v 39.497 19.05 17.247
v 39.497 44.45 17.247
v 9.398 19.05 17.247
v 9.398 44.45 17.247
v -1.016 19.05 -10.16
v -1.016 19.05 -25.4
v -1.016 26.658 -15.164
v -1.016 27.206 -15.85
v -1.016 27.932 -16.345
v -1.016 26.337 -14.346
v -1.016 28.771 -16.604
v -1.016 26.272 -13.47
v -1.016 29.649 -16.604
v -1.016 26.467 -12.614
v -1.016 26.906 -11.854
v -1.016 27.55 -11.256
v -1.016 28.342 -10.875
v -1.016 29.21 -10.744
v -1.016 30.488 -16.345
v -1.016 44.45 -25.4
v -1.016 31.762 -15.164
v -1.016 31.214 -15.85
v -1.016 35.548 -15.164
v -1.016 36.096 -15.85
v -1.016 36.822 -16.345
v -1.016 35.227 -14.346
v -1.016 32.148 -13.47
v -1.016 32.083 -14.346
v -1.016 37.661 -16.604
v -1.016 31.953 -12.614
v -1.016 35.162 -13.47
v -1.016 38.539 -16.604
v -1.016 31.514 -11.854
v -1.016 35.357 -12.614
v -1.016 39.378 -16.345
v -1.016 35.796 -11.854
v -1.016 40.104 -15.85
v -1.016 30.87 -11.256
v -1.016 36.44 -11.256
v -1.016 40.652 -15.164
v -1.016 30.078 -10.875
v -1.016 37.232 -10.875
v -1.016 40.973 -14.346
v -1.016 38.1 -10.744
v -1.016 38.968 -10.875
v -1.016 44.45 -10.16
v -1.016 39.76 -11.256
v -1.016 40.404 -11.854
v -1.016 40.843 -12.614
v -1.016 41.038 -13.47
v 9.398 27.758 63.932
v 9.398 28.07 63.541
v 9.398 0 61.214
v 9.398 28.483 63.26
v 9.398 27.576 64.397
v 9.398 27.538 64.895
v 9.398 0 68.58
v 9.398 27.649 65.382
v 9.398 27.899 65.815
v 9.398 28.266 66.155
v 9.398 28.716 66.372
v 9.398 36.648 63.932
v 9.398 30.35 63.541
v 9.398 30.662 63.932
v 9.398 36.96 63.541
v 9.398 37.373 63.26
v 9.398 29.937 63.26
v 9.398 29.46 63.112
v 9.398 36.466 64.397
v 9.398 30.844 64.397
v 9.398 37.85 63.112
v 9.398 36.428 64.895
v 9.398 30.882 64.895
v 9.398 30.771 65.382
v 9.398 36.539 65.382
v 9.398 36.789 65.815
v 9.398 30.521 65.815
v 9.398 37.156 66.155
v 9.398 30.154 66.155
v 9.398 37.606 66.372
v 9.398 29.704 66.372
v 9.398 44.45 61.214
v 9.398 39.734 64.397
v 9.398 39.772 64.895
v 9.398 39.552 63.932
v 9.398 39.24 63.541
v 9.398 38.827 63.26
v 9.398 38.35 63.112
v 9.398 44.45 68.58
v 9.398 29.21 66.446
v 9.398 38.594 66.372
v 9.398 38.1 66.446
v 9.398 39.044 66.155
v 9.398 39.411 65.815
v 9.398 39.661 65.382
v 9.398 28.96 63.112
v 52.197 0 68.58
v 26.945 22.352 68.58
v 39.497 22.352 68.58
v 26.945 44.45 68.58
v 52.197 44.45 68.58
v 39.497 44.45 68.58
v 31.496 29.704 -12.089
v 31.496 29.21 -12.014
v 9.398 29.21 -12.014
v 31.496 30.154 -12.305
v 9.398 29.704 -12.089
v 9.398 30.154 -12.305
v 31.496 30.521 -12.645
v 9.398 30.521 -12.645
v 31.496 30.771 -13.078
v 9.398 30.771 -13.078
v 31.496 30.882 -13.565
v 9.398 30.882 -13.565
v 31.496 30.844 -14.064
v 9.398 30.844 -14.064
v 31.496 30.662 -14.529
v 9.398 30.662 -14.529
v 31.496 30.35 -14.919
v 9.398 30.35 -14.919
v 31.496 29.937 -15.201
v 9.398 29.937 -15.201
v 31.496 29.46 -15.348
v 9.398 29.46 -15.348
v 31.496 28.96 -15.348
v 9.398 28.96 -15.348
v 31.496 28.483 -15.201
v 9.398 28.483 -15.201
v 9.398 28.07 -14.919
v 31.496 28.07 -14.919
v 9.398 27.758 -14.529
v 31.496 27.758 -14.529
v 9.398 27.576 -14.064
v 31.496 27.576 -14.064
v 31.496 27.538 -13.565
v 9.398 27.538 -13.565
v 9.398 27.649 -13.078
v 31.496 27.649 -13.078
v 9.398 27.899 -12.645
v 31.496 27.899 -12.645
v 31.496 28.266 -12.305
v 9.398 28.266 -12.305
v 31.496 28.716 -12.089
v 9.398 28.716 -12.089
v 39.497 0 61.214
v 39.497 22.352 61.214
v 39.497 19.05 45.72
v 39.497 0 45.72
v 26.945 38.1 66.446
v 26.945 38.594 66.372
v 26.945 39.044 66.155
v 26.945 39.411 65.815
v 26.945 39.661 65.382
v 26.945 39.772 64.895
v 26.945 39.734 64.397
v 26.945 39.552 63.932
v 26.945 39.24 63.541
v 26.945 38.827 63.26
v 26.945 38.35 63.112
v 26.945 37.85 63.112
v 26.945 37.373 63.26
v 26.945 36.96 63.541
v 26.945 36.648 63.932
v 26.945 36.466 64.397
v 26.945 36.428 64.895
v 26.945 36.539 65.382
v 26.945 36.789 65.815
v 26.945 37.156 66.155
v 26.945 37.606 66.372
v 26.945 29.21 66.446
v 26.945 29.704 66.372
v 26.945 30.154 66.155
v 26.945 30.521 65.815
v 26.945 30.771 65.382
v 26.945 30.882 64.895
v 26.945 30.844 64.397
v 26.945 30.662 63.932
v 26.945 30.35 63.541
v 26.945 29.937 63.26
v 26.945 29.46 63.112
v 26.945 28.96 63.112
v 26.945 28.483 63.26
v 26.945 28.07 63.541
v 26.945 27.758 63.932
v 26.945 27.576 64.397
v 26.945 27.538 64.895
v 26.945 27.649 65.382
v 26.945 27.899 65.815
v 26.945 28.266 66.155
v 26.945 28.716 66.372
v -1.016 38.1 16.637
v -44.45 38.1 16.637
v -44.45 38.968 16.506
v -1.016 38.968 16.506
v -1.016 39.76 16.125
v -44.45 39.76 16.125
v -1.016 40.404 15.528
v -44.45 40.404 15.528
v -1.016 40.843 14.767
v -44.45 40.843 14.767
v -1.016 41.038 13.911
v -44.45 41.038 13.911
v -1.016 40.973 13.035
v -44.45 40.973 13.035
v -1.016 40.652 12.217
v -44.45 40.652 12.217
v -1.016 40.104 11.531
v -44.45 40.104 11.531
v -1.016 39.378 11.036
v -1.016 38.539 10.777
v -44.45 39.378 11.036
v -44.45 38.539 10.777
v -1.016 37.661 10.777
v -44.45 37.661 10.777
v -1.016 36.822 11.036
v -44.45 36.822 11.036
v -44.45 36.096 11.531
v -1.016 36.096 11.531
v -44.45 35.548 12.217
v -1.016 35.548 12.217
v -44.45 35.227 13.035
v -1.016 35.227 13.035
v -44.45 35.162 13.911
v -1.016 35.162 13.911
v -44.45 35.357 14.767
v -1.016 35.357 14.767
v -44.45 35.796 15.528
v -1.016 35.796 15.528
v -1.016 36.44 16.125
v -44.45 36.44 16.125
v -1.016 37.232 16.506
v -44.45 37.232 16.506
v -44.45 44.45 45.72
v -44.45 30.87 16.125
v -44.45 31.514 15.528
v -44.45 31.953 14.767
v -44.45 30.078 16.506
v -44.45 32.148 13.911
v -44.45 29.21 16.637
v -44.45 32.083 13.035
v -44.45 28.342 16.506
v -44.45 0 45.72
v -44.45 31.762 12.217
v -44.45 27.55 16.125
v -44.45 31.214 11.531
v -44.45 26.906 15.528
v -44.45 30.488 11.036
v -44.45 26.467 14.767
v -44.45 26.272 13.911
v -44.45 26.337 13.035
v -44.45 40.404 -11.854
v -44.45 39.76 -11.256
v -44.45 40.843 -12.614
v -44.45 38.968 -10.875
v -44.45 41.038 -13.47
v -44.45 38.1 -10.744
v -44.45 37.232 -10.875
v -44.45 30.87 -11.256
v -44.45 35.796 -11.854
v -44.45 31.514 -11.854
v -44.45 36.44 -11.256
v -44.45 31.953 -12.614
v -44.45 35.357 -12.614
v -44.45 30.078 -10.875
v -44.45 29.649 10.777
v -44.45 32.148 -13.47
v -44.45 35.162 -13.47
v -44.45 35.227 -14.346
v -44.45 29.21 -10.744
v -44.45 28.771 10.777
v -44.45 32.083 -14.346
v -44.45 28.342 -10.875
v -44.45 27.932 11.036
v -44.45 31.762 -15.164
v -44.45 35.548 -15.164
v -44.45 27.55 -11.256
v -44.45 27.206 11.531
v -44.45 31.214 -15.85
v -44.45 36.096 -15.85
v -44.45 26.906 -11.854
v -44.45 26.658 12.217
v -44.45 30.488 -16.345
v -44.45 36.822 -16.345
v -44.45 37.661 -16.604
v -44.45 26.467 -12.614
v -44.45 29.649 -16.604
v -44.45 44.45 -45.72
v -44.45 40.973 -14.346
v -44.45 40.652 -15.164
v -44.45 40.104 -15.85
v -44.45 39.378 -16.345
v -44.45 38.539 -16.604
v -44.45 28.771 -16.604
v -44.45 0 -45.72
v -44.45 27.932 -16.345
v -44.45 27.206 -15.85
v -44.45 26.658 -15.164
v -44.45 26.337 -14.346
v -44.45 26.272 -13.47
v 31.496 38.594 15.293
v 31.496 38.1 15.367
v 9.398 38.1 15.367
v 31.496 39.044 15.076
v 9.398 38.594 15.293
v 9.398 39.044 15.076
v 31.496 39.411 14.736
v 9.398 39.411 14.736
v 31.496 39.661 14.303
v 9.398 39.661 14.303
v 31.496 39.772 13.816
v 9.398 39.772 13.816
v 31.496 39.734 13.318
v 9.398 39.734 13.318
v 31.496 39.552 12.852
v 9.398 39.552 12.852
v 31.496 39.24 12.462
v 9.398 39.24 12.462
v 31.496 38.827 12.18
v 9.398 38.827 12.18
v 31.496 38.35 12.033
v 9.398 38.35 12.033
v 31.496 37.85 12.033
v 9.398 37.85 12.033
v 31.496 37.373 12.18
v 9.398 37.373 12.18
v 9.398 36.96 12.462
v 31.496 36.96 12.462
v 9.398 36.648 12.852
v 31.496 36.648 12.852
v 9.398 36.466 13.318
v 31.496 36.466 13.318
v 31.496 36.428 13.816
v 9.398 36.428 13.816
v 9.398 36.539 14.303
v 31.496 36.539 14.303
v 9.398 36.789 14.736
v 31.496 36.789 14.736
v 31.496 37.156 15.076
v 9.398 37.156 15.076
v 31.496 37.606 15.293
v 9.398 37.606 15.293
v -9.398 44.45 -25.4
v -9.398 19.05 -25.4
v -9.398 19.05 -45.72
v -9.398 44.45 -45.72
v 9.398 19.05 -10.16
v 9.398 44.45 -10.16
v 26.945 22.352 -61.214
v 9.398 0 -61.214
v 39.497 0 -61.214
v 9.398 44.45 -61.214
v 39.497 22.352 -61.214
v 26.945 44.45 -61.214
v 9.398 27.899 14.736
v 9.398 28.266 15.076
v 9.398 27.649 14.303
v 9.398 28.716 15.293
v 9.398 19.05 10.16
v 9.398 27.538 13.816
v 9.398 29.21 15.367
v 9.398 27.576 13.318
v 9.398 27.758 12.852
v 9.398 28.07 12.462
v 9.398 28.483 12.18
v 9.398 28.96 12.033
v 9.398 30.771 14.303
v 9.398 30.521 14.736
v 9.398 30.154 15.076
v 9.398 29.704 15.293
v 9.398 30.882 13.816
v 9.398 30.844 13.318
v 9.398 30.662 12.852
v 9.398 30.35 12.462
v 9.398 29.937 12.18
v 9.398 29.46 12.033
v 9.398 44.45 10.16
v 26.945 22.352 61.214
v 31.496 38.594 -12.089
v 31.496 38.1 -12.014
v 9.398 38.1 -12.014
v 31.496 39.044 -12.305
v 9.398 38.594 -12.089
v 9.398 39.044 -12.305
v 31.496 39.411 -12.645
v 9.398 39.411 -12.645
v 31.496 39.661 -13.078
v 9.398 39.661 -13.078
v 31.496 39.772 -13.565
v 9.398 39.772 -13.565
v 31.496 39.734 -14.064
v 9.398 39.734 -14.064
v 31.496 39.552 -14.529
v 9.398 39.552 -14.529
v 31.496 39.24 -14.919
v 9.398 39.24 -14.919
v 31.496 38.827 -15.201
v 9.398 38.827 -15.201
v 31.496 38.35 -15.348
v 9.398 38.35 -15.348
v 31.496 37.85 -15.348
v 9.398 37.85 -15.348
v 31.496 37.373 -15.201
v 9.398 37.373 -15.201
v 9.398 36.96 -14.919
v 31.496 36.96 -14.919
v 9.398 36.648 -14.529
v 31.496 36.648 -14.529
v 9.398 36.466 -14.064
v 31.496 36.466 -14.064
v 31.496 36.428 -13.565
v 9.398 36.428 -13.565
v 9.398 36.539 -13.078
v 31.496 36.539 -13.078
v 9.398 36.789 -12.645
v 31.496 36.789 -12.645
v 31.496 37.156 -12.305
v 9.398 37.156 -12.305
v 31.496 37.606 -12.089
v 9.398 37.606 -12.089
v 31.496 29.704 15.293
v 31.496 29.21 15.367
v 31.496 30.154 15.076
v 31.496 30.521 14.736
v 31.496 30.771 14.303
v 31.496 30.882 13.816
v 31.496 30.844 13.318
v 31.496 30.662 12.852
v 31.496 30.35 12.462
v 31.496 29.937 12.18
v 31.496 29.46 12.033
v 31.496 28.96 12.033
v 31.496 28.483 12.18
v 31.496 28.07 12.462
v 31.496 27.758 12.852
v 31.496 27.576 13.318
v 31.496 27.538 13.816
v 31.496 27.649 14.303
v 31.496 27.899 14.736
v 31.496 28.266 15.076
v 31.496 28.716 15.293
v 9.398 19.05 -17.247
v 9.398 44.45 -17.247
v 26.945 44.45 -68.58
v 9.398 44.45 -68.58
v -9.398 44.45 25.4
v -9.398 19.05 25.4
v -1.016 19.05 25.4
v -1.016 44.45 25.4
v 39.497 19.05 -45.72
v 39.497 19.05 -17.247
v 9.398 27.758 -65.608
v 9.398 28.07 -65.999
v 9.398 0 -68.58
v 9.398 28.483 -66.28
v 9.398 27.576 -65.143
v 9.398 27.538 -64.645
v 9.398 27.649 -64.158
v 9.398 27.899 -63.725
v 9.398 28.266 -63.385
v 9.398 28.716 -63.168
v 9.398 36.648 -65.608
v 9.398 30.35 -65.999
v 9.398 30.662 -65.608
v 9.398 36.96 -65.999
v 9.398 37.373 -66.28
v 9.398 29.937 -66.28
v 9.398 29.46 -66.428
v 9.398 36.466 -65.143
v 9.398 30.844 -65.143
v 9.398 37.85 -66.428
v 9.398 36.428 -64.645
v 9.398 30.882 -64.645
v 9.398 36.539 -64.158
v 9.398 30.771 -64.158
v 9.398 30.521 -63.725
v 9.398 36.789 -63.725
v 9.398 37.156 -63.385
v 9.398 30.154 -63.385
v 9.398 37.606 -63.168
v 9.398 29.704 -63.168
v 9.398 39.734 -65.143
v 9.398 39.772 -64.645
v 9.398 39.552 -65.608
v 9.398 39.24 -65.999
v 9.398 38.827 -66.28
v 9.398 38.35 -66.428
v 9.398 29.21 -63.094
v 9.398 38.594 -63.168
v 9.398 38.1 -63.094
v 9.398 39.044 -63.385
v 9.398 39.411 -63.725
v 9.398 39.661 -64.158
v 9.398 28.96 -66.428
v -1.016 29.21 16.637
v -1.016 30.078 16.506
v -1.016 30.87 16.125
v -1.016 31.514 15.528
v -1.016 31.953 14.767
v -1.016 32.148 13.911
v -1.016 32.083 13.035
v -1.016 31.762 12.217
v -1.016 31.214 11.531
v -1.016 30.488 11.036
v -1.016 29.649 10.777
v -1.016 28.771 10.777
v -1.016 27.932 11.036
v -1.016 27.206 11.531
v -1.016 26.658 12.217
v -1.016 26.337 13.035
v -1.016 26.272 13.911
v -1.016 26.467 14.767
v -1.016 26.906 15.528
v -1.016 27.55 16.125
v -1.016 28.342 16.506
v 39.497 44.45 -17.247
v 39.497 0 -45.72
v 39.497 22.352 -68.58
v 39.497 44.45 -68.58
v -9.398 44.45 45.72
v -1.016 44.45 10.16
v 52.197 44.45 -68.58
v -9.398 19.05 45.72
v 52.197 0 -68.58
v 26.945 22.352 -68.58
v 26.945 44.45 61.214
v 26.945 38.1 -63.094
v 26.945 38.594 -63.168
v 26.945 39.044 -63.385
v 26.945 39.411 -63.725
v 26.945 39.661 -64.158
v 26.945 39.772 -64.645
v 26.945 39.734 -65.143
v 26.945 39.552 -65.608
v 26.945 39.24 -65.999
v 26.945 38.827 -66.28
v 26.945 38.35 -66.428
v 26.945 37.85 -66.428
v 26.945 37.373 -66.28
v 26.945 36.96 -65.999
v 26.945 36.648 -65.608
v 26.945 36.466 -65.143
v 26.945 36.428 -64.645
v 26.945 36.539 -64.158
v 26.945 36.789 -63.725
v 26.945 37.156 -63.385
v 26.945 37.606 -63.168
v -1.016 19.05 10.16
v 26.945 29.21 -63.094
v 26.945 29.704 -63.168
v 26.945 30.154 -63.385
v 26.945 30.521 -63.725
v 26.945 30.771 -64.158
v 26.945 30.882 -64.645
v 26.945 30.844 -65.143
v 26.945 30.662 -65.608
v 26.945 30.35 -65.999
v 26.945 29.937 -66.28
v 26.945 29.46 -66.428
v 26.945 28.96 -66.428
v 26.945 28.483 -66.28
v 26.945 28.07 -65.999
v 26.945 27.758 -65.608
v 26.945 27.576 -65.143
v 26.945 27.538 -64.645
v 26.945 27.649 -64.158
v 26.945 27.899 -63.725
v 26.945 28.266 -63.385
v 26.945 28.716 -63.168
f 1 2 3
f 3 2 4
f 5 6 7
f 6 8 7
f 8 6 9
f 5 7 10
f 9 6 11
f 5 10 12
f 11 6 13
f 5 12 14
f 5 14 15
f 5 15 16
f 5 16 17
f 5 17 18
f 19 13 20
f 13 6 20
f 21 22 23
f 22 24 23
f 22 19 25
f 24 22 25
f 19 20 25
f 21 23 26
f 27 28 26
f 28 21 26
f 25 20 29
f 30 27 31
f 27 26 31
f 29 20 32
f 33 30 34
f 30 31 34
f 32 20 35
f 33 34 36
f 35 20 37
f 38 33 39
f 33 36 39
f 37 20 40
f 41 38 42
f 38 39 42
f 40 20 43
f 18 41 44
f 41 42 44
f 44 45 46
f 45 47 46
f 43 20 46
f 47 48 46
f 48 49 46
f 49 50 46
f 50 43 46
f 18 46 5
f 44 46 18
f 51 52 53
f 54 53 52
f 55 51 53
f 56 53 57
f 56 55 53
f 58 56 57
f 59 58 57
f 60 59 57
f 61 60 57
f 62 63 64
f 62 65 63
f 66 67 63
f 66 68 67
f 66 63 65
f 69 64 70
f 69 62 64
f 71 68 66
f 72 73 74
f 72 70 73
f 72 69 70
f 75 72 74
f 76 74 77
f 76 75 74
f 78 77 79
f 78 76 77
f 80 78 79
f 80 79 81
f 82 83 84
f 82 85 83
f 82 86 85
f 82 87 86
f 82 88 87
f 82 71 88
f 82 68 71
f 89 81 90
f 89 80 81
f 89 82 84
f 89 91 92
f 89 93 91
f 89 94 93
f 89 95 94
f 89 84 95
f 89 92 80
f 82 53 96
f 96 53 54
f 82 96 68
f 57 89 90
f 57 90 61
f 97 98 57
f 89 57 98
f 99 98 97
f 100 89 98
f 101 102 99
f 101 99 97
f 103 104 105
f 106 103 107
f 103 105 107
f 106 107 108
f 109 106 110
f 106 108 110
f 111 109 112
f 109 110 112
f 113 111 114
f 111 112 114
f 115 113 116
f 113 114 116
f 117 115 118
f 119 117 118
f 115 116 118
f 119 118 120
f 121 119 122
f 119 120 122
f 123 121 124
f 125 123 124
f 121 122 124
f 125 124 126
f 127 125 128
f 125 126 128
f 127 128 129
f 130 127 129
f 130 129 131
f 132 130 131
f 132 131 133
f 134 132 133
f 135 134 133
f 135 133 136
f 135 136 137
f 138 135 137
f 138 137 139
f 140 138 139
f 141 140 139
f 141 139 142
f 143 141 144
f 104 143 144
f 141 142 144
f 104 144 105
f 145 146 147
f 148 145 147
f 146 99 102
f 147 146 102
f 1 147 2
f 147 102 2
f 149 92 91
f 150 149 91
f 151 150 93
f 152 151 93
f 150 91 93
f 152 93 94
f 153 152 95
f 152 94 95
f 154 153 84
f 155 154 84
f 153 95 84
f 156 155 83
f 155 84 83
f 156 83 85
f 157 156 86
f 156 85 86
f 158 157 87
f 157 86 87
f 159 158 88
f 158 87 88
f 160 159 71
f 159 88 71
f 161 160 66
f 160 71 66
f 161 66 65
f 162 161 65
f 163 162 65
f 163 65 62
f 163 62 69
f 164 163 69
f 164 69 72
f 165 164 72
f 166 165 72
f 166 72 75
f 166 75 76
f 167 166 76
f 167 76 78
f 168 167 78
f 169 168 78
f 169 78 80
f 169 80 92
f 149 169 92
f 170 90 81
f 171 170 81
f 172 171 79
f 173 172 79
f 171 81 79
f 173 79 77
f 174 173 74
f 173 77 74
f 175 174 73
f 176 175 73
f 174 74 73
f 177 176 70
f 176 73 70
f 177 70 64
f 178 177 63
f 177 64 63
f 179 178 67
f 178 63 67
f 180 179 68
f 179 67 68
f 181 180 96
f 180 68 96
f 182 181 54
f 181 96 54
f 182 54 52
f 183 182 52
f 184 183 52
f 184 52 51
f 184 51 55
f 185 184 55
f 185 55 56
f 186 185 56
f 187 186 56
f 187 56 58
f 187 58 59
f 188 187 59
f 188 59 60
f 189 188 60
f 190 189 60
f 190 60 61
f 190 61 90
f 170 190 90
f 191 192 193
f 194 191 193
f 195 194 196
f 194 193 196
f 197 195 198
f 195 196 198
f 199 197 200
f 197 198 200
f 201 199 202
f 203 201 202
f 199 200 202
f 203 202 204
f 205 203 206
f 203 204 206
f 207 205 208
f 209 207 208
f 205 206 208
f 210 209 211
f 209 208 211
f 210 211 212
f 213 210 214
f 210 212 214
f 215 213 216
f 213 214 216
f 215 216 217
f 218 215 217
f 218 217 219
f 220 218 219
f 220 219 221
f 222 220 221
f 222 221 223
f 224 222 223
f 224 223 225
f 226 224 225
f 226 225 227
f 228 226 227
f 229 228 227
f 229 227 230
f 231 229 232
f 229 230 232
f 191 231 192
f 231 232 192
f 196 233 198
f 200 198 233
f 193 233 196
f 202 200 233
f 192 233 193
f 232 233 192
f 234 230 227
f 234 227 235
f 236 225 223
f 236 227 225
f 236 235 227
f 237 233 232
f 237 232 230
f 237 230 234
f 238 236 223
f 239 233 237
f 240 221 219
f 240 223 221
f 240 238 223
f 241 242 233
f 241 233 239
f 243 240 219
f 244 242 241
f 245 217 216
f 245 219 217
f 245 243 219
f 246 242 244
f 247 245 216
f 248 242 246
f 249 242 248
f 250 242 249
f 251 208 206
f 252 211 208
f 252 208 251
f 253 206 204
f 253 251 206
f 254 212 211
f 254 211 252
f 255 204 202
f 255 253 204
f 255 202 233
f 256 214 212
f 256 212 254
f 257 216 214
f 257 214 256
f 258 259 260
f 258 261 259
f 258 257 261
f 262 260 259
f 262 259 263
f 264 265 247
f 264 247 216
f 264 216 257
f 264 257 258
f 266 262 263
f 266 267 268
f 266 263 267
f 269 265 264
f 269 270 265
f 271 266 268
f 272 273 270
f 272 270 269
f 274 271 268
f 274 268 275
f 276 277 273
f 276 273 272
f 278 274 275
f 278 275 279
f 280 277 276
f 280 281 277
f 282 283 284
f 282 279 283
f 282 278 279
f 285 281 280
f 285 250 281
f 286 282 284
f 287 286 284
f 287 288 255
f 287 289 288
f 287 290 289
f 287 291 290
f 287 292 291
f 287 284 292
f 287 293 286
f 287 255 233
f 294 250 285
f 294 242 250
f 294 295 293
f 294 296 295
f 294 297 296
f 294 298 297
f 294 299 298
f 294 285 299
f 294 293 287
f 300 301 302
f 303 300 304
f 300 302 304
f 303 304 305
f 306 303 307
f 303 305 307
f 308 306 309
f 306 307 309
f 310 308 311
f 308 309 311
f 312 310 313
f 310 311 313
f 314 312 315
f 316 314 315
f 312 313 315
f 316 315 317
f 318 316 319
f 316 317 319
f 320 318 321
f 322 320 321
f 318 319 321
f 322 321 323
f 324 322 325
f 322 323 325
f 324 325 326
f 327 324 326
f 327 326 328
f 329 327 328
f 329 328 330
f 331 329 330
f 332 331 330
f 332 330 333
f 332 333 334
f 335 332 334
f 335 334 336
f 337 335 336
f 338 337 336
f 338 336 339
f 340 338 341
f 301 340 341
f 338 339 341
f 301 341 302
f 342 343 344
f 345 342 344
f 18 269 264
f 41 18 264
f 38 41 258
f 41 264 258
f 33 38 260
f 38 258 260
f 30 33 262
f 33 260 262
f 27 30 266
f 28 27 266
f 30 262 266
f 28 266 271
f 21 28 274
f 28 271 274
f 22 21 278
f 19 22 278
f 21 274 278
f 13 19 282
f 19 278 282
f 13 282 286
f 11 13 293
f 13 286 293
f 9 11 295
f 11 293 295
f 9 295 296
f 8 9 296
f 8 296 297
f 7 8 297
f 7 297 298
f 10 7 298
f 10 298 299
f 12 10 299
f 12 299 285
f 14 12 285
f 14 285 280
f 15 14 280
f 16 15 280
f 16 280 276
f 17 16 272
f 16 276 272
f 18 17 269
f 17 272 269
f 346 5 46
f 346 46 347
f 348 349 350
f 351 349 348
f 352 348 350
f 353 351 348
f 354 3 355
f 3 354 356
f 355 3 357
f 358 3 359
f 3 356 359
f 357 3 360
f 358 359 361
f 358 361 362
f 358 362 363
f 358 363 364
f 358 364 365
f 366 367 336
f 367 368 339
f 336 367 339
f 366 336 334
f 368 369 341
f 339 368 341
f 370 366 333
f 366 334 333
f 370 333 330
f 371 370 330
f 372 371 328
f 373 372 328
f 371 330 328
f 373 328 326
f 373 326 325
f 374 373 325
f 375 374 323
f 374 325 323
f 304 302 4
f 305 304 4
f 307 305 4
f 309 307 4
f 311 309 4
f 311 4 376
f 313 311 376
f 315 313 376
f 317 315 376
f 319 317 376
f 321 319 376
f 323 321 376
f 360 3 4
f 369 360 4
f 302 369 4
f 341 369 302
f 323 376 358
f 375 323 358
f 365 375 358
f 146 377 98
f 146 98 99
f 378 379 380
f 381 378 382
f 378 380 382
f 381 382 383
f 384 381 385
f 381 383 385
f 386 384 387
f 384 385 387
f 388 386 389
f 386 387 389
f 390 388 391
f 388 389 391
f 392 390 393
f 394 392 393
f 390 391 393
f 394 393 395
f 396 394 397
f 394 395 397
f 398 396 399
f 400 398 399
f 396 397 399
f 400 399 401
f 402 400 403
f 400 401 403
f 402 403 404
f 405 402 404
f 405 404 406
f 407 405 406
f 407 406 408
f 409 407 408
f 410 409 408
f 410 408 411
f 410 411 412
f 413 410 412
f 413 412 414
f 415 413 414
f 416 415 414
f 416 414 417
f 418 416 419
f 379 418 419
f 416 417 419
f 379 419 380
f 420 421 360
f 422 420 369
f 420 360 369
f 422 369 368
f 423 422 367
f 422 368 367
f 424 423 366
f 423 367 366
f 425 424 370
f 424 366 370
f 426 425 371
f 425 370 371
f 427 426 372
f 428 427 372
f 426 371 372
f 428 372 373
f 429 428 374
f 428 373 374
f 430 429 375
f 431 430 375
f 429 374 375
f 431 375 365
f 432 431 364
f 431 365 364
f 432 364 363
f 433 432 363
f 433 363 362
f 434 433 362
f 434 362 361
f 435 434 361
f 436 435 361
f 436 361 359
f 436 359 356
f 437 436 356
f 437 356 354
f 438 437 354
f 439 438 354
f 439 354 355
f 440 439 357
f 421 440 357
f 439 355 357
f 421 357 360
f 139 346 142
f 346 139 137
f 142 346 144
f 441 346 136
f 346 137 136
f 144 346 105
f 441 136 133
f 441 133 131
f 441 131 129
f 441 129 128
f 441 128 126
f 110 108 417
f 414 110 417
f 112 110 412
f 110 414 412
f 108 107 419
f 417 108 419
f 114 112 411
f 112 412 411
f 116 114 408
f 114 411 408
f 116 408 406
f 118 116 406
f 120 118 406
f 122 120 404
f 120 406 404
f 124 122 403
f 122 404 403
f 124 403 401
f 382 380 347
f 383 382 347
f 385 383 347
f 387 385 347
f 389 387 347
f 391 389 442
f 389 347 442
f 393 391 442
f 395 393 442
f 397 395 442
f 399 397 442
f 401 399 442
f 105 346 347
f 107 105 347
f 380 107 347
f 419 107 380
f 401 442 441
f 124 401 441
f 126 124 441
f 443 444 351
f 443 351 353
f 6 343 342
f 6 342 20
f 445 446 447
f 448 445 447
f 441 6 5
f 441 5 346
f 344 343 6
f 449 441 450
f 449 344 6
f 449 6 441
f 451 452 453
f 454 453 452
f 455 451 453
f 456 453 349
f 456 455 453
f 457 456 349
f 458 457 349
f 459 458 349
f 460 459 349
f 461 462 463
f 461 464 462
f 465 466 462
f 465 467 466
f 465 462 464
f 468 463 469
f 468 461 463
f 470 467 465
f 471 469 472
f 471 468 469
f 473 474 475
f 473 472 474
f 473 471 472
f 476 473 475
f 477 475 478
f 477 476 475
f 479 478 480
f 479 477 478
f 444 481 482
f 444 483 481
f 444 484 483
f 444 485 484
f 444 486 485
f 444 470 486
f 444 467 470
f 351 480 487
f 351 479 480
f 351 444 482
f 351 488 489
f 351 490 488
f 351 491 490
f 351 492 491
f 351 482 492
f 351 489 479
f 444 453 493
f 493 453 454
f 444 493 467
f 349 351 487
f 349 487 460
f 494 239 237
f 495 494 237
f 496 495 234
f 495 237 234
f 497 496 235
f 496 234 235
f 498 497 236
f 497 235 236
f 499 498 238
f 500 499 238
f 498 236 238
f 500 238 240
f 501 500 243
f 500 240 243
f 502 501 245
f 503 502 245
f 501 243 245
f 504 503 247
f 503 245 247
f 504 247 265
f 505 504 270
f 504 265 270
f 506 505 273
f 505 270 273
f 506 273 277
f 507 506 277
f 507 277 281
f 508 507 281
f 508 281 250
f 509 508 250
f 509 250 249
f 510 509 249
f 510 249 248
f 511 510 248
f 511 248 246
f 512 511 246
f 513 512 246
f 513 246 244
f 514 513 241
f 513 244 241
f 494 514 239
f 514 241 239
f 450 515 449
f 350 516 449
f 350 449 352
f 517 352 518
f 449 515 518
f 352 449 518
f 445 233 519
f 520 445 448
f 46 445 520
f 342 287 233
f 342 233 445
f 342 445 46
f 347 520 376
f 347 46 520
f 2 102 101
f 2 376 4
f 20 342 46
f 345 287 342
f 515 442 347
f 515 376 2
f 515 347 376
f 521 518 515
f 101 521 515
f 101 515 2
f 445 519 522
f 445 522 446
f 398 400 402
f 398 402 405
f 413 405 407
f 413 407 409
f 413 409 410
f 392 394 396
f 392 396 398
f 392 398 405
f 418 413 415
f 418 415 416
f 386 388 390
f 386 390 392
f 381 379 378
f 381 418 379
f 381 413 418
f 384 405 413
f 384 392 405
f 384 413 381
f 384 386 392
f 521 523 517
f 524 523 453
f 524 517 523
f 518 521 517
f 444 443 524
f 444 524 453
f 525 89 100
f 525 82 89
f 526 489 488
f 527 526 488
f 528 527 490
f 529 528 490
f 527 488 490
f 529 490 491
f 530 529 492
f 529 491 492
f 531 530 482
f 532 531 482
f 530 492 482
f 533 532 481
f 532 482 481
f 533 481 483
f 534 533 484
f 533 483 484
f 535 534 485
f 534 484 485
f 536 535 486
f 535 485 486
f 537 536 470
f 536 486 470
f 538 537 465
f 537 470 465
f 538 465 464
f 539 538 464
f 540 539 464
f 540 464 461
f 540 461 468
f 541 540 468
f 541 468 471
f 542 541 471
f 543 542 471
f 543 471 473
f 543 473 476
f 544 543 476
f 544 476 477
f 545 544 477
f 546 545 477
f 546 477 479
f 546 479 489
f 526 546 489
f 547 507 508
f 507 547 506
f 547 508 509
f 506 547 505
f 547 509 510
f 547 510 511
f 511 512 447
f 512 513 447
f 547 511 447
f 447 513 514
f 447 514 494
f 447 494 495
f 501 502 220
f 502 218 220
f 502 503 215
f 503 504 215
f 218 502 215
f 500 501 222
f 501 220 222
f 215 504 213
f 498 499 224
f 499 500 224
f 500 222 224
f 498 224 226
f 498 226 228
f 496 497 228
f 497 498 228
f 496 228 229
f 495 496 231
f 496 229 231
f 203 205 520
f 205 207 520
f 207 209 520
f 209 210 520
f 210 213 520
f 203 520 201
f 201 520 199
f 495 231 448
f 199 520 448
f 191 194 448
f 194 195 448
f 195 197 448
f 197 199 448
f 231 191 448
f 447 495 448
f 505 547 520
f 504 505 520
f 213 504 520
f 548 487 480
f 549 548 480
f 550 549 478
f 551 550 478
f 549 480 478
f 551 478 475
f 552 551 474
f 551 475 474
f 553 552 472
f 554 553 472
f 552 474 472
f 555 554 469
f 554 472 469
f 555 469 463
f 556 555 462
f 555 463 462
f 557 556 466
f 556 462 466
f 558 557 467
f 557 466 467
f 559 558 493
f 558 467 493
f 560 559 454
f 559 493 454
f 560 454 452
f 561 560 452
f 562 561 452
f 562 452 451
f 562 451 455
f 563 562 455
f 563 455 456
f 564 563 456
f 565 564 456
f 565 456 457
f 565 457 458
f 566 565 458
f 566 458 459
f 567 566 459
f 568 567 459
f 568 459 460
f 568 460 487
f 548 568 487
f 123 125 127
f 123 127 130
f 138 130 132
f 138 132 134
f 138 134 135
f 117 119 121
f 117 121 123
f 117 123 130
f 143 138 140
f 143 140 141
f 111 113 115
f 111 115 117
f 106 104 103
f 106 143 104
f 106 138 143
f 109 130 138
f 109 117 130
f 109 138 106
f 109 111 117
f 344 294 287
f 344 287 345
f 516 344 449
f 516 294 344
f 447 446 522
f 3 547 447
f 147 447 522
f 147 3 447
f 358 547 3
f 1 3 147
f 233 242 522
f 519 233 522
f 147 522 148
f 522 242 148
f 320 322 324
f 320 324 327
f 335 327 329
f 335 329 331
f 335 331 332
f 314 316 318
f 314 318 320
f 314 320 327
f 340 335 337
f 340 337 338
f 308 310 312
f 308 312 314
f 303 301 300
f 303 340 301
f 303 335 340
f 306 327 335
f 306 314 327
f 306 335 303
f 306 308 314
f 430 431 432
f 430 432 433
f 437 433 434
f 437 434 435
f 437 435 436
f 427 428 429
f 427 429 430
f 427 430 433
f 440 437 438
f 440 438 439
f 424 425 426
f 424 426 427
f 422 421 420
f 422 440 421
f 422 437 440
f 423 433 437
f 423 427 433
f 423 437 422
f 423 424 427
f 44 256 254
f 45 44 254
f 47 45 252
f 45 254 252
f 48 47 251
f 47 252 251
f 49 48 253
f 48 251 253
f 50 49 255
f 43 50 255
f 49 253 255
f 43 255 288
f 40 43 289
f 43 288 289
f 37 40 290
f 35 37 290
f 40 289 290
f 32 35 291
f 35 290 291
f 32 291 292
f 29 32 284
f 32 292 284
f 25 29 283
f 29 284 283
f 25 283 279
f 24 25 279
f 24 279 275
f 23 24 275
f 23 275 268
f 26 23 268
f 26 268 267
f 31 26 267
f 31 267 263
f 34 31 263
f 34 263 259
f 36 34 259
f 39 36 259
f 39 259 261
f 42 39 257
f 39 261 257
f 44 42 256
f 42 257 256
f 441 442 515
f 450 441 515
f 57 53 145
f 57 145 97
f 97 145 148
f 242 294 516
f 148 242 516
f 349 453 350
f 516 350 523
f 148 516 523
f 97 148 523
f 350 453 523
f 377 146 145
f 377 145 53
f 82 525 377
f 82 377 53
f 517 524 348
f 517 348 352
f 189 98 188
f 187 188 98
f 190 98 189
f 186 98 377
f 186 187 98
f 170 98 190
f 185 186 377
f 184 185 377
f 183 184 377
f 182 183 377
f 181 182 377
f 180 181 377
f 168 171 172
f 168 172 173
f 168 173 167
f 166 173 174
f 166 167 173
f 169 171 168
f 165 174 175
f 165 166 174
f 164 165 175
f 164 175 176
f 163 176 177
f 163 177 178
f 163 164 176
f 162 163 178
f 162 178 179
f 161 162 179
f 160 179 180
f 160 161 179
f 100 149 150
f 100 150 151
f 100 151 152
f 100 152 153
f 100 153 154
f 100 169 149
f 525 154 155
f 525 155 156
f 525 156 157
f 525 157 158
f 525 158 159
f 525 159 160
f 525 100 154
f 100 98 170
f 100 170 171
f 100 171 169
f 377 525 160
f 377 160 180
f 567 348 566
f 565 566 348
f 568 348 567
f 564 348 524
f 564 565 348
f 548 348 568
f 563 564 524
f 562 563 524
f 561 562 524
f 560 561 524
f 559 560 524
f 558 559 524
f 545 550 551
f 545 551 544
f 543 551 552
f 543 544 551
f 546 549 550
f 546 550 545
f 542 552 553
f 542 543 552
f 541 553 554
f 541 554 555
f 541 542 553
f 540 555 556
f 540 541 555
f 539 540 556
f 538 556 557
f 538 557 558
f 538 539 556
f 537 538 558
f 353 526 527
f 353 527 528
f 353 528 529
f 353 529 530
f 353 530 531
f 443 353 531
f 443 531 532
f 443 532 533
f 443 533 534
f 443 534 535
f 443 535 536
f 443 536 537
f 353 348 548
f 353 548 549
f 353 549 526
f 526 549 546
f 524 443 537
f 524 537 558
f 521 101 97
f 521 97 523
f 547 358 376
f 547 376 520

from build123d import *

# Parameters (mm, degrees)
SKETCH1_W           = 88.9
SKETCH1_H           = 91.44
BOSS_EXTRUDE1_DEPTH = 44.45
SKETCH2_W           = 8.382
SKETCH2_H           = 20.32
CUT_EXTRUDE1_DEPTH  = 25.4
BOSS_EXTRUDE2_DEPTH = 44.45
SKETCH4_R           = 1.6764
CUT_EXTRUDE4_DEPTH  = 22.098
SKETCH5_R           = 2.9464
CUT_EXTRUDE6_DEPTH  = 43.434
SKETCH7_W           = 12.552336234
SKETCH7_H           = 7.366
CUT_EXTRUDE7_DEPTH  = 22.098


with BuildPart() as part:
    # Sketch1 → Boss-Extrude1 (new body)
    with BuildSketch(Plane(origin=(0, 0, 0), x_dir=(1, 0, 0), z_dir=(0, 1, 0))):
        Rectangle(SKETCH1_W, SKETCH1_H)
    extrude(amount=BOSS_EXTRUDE1_DEPTH)

    # Sketch2 → Cut-Extrude1 (cut)
    with BuildSketch(Plane(origin=(0, 44.45, 0), x_dir=(1, 0, 0), z_dir=(0, 1, 0))):
        with Locations((-5.207, -35.56)):
            Rectangle(SKETCH2_W, SKETCH2_H)
        Polygon((-1.016, -45.72), (39.497, -45.72), (39.497, -17.2466), (9.398, -17.2466), (9.398, -10.16), (-1.016, -10.16), (-1.016, -25.4), align=None)
        Polygon((39.497, 17.2466), (39.497, 45.72), (-1.016, 45.72), (-1.016, 25.4), (-1.016, 10.16), (9.398, 10.16), (9.398, 17.2466), align=None)
        with Locations((-5.207, 35.56)):
            Rectangle(SKETCH2_W, SKETCH2_H)
    extrude(amount=-CUT_EXTRUDE1_DEPTH, mode=Mode.SUBTRACT)

    # Sketch3 → Boss-Extrude2 (add)
    with BuildSketch(Plane(origin=(0, 44.45, 0), x_dir=(1, 0, 0), z_dir=(0, 1, 0))):
        Polygon((52.197, -68.58), (52.197, 68.58), (9.398, 68.58), (9.398, 61.214), (39.497, 61.214), (39.497, 45.72), (44.45, 45.72), (44.45, -45.72), (39.497, -45.72), (39.497, -61.214), (9.398, -61.214), (9.398, -68.58), align=None)
    extrude(amount=-BOSS_EXTRUDE2_DEPTH)

    # Sketch4 → Cut-Extrude4 (cut)
    with BuildSketch(Plane.ZY.offset(-9.398)):
        with Locations((-64.77, 29.21)):
            Circle(SKETCH4_R)
        with Locations((-64.77, 38.1)):
            Circle(SKETCH4_R)
        with Locations((-13.6906, 38.1)):
            Circle(SKETCH4_R)
        with Locations((-13.6906, 29.21)):
            Circle(SKETCH4_R)
        with Locations((13.6906, 38.1)):
            Circle(SKETCH4_R)
        with Locations((13.6906, 29.21)):
            Circle(SKETCH4_R)
        with Locations((64.77, 38.1)):
            Circle(SKETCH4_R)
        with Locations((64.77, 29.21)):
            Circle(SKETCH4_R)
    extrude(amount=-CUT_EXTRUDE4_DEPTH, mode=Mode.SUBTRACT)

    # Sketch5 → Cut-Extrude6 (cut)
    with BuildSketch(Plane.ZY.offset(44.45)):
        with Locations((-13.6906, 38.1)):
            Circle(SKETCH5_R)
        with Locations((-13.6906, 29.21)):
            Circle(SKETCH5_R)
        with Locations((13.6906, 38.1)):
            Circle(SKETCH5_R)
        with Locations((13.6906, 29.21)):
            Circle(SKETCH5_R)
    extrude(amount=-CUT_EXTRUDE6_DEPTH, mode=Mode.SUBTRACT)

    # Sketch7 → Cut-Extrude7 (cut)
    with BuildSketch(Plane(origin=(0, 44.45, 0), x_dir=(1, 0, 0), z_dir=(0, 1, 0))):
        with Locations((33.220831883, -64.897)):
            Rectangle(SKETCH7_W, SKETCH7_H)
        with Locations((33.220831883, 64.897)):
            Rectangle(SKETCH7_W, SKETCH7_H)
    extrude(amount=-CUT_EXTRUDE7_DEPTH, mode=Mode.SUBTRACT)


solid = part.part
